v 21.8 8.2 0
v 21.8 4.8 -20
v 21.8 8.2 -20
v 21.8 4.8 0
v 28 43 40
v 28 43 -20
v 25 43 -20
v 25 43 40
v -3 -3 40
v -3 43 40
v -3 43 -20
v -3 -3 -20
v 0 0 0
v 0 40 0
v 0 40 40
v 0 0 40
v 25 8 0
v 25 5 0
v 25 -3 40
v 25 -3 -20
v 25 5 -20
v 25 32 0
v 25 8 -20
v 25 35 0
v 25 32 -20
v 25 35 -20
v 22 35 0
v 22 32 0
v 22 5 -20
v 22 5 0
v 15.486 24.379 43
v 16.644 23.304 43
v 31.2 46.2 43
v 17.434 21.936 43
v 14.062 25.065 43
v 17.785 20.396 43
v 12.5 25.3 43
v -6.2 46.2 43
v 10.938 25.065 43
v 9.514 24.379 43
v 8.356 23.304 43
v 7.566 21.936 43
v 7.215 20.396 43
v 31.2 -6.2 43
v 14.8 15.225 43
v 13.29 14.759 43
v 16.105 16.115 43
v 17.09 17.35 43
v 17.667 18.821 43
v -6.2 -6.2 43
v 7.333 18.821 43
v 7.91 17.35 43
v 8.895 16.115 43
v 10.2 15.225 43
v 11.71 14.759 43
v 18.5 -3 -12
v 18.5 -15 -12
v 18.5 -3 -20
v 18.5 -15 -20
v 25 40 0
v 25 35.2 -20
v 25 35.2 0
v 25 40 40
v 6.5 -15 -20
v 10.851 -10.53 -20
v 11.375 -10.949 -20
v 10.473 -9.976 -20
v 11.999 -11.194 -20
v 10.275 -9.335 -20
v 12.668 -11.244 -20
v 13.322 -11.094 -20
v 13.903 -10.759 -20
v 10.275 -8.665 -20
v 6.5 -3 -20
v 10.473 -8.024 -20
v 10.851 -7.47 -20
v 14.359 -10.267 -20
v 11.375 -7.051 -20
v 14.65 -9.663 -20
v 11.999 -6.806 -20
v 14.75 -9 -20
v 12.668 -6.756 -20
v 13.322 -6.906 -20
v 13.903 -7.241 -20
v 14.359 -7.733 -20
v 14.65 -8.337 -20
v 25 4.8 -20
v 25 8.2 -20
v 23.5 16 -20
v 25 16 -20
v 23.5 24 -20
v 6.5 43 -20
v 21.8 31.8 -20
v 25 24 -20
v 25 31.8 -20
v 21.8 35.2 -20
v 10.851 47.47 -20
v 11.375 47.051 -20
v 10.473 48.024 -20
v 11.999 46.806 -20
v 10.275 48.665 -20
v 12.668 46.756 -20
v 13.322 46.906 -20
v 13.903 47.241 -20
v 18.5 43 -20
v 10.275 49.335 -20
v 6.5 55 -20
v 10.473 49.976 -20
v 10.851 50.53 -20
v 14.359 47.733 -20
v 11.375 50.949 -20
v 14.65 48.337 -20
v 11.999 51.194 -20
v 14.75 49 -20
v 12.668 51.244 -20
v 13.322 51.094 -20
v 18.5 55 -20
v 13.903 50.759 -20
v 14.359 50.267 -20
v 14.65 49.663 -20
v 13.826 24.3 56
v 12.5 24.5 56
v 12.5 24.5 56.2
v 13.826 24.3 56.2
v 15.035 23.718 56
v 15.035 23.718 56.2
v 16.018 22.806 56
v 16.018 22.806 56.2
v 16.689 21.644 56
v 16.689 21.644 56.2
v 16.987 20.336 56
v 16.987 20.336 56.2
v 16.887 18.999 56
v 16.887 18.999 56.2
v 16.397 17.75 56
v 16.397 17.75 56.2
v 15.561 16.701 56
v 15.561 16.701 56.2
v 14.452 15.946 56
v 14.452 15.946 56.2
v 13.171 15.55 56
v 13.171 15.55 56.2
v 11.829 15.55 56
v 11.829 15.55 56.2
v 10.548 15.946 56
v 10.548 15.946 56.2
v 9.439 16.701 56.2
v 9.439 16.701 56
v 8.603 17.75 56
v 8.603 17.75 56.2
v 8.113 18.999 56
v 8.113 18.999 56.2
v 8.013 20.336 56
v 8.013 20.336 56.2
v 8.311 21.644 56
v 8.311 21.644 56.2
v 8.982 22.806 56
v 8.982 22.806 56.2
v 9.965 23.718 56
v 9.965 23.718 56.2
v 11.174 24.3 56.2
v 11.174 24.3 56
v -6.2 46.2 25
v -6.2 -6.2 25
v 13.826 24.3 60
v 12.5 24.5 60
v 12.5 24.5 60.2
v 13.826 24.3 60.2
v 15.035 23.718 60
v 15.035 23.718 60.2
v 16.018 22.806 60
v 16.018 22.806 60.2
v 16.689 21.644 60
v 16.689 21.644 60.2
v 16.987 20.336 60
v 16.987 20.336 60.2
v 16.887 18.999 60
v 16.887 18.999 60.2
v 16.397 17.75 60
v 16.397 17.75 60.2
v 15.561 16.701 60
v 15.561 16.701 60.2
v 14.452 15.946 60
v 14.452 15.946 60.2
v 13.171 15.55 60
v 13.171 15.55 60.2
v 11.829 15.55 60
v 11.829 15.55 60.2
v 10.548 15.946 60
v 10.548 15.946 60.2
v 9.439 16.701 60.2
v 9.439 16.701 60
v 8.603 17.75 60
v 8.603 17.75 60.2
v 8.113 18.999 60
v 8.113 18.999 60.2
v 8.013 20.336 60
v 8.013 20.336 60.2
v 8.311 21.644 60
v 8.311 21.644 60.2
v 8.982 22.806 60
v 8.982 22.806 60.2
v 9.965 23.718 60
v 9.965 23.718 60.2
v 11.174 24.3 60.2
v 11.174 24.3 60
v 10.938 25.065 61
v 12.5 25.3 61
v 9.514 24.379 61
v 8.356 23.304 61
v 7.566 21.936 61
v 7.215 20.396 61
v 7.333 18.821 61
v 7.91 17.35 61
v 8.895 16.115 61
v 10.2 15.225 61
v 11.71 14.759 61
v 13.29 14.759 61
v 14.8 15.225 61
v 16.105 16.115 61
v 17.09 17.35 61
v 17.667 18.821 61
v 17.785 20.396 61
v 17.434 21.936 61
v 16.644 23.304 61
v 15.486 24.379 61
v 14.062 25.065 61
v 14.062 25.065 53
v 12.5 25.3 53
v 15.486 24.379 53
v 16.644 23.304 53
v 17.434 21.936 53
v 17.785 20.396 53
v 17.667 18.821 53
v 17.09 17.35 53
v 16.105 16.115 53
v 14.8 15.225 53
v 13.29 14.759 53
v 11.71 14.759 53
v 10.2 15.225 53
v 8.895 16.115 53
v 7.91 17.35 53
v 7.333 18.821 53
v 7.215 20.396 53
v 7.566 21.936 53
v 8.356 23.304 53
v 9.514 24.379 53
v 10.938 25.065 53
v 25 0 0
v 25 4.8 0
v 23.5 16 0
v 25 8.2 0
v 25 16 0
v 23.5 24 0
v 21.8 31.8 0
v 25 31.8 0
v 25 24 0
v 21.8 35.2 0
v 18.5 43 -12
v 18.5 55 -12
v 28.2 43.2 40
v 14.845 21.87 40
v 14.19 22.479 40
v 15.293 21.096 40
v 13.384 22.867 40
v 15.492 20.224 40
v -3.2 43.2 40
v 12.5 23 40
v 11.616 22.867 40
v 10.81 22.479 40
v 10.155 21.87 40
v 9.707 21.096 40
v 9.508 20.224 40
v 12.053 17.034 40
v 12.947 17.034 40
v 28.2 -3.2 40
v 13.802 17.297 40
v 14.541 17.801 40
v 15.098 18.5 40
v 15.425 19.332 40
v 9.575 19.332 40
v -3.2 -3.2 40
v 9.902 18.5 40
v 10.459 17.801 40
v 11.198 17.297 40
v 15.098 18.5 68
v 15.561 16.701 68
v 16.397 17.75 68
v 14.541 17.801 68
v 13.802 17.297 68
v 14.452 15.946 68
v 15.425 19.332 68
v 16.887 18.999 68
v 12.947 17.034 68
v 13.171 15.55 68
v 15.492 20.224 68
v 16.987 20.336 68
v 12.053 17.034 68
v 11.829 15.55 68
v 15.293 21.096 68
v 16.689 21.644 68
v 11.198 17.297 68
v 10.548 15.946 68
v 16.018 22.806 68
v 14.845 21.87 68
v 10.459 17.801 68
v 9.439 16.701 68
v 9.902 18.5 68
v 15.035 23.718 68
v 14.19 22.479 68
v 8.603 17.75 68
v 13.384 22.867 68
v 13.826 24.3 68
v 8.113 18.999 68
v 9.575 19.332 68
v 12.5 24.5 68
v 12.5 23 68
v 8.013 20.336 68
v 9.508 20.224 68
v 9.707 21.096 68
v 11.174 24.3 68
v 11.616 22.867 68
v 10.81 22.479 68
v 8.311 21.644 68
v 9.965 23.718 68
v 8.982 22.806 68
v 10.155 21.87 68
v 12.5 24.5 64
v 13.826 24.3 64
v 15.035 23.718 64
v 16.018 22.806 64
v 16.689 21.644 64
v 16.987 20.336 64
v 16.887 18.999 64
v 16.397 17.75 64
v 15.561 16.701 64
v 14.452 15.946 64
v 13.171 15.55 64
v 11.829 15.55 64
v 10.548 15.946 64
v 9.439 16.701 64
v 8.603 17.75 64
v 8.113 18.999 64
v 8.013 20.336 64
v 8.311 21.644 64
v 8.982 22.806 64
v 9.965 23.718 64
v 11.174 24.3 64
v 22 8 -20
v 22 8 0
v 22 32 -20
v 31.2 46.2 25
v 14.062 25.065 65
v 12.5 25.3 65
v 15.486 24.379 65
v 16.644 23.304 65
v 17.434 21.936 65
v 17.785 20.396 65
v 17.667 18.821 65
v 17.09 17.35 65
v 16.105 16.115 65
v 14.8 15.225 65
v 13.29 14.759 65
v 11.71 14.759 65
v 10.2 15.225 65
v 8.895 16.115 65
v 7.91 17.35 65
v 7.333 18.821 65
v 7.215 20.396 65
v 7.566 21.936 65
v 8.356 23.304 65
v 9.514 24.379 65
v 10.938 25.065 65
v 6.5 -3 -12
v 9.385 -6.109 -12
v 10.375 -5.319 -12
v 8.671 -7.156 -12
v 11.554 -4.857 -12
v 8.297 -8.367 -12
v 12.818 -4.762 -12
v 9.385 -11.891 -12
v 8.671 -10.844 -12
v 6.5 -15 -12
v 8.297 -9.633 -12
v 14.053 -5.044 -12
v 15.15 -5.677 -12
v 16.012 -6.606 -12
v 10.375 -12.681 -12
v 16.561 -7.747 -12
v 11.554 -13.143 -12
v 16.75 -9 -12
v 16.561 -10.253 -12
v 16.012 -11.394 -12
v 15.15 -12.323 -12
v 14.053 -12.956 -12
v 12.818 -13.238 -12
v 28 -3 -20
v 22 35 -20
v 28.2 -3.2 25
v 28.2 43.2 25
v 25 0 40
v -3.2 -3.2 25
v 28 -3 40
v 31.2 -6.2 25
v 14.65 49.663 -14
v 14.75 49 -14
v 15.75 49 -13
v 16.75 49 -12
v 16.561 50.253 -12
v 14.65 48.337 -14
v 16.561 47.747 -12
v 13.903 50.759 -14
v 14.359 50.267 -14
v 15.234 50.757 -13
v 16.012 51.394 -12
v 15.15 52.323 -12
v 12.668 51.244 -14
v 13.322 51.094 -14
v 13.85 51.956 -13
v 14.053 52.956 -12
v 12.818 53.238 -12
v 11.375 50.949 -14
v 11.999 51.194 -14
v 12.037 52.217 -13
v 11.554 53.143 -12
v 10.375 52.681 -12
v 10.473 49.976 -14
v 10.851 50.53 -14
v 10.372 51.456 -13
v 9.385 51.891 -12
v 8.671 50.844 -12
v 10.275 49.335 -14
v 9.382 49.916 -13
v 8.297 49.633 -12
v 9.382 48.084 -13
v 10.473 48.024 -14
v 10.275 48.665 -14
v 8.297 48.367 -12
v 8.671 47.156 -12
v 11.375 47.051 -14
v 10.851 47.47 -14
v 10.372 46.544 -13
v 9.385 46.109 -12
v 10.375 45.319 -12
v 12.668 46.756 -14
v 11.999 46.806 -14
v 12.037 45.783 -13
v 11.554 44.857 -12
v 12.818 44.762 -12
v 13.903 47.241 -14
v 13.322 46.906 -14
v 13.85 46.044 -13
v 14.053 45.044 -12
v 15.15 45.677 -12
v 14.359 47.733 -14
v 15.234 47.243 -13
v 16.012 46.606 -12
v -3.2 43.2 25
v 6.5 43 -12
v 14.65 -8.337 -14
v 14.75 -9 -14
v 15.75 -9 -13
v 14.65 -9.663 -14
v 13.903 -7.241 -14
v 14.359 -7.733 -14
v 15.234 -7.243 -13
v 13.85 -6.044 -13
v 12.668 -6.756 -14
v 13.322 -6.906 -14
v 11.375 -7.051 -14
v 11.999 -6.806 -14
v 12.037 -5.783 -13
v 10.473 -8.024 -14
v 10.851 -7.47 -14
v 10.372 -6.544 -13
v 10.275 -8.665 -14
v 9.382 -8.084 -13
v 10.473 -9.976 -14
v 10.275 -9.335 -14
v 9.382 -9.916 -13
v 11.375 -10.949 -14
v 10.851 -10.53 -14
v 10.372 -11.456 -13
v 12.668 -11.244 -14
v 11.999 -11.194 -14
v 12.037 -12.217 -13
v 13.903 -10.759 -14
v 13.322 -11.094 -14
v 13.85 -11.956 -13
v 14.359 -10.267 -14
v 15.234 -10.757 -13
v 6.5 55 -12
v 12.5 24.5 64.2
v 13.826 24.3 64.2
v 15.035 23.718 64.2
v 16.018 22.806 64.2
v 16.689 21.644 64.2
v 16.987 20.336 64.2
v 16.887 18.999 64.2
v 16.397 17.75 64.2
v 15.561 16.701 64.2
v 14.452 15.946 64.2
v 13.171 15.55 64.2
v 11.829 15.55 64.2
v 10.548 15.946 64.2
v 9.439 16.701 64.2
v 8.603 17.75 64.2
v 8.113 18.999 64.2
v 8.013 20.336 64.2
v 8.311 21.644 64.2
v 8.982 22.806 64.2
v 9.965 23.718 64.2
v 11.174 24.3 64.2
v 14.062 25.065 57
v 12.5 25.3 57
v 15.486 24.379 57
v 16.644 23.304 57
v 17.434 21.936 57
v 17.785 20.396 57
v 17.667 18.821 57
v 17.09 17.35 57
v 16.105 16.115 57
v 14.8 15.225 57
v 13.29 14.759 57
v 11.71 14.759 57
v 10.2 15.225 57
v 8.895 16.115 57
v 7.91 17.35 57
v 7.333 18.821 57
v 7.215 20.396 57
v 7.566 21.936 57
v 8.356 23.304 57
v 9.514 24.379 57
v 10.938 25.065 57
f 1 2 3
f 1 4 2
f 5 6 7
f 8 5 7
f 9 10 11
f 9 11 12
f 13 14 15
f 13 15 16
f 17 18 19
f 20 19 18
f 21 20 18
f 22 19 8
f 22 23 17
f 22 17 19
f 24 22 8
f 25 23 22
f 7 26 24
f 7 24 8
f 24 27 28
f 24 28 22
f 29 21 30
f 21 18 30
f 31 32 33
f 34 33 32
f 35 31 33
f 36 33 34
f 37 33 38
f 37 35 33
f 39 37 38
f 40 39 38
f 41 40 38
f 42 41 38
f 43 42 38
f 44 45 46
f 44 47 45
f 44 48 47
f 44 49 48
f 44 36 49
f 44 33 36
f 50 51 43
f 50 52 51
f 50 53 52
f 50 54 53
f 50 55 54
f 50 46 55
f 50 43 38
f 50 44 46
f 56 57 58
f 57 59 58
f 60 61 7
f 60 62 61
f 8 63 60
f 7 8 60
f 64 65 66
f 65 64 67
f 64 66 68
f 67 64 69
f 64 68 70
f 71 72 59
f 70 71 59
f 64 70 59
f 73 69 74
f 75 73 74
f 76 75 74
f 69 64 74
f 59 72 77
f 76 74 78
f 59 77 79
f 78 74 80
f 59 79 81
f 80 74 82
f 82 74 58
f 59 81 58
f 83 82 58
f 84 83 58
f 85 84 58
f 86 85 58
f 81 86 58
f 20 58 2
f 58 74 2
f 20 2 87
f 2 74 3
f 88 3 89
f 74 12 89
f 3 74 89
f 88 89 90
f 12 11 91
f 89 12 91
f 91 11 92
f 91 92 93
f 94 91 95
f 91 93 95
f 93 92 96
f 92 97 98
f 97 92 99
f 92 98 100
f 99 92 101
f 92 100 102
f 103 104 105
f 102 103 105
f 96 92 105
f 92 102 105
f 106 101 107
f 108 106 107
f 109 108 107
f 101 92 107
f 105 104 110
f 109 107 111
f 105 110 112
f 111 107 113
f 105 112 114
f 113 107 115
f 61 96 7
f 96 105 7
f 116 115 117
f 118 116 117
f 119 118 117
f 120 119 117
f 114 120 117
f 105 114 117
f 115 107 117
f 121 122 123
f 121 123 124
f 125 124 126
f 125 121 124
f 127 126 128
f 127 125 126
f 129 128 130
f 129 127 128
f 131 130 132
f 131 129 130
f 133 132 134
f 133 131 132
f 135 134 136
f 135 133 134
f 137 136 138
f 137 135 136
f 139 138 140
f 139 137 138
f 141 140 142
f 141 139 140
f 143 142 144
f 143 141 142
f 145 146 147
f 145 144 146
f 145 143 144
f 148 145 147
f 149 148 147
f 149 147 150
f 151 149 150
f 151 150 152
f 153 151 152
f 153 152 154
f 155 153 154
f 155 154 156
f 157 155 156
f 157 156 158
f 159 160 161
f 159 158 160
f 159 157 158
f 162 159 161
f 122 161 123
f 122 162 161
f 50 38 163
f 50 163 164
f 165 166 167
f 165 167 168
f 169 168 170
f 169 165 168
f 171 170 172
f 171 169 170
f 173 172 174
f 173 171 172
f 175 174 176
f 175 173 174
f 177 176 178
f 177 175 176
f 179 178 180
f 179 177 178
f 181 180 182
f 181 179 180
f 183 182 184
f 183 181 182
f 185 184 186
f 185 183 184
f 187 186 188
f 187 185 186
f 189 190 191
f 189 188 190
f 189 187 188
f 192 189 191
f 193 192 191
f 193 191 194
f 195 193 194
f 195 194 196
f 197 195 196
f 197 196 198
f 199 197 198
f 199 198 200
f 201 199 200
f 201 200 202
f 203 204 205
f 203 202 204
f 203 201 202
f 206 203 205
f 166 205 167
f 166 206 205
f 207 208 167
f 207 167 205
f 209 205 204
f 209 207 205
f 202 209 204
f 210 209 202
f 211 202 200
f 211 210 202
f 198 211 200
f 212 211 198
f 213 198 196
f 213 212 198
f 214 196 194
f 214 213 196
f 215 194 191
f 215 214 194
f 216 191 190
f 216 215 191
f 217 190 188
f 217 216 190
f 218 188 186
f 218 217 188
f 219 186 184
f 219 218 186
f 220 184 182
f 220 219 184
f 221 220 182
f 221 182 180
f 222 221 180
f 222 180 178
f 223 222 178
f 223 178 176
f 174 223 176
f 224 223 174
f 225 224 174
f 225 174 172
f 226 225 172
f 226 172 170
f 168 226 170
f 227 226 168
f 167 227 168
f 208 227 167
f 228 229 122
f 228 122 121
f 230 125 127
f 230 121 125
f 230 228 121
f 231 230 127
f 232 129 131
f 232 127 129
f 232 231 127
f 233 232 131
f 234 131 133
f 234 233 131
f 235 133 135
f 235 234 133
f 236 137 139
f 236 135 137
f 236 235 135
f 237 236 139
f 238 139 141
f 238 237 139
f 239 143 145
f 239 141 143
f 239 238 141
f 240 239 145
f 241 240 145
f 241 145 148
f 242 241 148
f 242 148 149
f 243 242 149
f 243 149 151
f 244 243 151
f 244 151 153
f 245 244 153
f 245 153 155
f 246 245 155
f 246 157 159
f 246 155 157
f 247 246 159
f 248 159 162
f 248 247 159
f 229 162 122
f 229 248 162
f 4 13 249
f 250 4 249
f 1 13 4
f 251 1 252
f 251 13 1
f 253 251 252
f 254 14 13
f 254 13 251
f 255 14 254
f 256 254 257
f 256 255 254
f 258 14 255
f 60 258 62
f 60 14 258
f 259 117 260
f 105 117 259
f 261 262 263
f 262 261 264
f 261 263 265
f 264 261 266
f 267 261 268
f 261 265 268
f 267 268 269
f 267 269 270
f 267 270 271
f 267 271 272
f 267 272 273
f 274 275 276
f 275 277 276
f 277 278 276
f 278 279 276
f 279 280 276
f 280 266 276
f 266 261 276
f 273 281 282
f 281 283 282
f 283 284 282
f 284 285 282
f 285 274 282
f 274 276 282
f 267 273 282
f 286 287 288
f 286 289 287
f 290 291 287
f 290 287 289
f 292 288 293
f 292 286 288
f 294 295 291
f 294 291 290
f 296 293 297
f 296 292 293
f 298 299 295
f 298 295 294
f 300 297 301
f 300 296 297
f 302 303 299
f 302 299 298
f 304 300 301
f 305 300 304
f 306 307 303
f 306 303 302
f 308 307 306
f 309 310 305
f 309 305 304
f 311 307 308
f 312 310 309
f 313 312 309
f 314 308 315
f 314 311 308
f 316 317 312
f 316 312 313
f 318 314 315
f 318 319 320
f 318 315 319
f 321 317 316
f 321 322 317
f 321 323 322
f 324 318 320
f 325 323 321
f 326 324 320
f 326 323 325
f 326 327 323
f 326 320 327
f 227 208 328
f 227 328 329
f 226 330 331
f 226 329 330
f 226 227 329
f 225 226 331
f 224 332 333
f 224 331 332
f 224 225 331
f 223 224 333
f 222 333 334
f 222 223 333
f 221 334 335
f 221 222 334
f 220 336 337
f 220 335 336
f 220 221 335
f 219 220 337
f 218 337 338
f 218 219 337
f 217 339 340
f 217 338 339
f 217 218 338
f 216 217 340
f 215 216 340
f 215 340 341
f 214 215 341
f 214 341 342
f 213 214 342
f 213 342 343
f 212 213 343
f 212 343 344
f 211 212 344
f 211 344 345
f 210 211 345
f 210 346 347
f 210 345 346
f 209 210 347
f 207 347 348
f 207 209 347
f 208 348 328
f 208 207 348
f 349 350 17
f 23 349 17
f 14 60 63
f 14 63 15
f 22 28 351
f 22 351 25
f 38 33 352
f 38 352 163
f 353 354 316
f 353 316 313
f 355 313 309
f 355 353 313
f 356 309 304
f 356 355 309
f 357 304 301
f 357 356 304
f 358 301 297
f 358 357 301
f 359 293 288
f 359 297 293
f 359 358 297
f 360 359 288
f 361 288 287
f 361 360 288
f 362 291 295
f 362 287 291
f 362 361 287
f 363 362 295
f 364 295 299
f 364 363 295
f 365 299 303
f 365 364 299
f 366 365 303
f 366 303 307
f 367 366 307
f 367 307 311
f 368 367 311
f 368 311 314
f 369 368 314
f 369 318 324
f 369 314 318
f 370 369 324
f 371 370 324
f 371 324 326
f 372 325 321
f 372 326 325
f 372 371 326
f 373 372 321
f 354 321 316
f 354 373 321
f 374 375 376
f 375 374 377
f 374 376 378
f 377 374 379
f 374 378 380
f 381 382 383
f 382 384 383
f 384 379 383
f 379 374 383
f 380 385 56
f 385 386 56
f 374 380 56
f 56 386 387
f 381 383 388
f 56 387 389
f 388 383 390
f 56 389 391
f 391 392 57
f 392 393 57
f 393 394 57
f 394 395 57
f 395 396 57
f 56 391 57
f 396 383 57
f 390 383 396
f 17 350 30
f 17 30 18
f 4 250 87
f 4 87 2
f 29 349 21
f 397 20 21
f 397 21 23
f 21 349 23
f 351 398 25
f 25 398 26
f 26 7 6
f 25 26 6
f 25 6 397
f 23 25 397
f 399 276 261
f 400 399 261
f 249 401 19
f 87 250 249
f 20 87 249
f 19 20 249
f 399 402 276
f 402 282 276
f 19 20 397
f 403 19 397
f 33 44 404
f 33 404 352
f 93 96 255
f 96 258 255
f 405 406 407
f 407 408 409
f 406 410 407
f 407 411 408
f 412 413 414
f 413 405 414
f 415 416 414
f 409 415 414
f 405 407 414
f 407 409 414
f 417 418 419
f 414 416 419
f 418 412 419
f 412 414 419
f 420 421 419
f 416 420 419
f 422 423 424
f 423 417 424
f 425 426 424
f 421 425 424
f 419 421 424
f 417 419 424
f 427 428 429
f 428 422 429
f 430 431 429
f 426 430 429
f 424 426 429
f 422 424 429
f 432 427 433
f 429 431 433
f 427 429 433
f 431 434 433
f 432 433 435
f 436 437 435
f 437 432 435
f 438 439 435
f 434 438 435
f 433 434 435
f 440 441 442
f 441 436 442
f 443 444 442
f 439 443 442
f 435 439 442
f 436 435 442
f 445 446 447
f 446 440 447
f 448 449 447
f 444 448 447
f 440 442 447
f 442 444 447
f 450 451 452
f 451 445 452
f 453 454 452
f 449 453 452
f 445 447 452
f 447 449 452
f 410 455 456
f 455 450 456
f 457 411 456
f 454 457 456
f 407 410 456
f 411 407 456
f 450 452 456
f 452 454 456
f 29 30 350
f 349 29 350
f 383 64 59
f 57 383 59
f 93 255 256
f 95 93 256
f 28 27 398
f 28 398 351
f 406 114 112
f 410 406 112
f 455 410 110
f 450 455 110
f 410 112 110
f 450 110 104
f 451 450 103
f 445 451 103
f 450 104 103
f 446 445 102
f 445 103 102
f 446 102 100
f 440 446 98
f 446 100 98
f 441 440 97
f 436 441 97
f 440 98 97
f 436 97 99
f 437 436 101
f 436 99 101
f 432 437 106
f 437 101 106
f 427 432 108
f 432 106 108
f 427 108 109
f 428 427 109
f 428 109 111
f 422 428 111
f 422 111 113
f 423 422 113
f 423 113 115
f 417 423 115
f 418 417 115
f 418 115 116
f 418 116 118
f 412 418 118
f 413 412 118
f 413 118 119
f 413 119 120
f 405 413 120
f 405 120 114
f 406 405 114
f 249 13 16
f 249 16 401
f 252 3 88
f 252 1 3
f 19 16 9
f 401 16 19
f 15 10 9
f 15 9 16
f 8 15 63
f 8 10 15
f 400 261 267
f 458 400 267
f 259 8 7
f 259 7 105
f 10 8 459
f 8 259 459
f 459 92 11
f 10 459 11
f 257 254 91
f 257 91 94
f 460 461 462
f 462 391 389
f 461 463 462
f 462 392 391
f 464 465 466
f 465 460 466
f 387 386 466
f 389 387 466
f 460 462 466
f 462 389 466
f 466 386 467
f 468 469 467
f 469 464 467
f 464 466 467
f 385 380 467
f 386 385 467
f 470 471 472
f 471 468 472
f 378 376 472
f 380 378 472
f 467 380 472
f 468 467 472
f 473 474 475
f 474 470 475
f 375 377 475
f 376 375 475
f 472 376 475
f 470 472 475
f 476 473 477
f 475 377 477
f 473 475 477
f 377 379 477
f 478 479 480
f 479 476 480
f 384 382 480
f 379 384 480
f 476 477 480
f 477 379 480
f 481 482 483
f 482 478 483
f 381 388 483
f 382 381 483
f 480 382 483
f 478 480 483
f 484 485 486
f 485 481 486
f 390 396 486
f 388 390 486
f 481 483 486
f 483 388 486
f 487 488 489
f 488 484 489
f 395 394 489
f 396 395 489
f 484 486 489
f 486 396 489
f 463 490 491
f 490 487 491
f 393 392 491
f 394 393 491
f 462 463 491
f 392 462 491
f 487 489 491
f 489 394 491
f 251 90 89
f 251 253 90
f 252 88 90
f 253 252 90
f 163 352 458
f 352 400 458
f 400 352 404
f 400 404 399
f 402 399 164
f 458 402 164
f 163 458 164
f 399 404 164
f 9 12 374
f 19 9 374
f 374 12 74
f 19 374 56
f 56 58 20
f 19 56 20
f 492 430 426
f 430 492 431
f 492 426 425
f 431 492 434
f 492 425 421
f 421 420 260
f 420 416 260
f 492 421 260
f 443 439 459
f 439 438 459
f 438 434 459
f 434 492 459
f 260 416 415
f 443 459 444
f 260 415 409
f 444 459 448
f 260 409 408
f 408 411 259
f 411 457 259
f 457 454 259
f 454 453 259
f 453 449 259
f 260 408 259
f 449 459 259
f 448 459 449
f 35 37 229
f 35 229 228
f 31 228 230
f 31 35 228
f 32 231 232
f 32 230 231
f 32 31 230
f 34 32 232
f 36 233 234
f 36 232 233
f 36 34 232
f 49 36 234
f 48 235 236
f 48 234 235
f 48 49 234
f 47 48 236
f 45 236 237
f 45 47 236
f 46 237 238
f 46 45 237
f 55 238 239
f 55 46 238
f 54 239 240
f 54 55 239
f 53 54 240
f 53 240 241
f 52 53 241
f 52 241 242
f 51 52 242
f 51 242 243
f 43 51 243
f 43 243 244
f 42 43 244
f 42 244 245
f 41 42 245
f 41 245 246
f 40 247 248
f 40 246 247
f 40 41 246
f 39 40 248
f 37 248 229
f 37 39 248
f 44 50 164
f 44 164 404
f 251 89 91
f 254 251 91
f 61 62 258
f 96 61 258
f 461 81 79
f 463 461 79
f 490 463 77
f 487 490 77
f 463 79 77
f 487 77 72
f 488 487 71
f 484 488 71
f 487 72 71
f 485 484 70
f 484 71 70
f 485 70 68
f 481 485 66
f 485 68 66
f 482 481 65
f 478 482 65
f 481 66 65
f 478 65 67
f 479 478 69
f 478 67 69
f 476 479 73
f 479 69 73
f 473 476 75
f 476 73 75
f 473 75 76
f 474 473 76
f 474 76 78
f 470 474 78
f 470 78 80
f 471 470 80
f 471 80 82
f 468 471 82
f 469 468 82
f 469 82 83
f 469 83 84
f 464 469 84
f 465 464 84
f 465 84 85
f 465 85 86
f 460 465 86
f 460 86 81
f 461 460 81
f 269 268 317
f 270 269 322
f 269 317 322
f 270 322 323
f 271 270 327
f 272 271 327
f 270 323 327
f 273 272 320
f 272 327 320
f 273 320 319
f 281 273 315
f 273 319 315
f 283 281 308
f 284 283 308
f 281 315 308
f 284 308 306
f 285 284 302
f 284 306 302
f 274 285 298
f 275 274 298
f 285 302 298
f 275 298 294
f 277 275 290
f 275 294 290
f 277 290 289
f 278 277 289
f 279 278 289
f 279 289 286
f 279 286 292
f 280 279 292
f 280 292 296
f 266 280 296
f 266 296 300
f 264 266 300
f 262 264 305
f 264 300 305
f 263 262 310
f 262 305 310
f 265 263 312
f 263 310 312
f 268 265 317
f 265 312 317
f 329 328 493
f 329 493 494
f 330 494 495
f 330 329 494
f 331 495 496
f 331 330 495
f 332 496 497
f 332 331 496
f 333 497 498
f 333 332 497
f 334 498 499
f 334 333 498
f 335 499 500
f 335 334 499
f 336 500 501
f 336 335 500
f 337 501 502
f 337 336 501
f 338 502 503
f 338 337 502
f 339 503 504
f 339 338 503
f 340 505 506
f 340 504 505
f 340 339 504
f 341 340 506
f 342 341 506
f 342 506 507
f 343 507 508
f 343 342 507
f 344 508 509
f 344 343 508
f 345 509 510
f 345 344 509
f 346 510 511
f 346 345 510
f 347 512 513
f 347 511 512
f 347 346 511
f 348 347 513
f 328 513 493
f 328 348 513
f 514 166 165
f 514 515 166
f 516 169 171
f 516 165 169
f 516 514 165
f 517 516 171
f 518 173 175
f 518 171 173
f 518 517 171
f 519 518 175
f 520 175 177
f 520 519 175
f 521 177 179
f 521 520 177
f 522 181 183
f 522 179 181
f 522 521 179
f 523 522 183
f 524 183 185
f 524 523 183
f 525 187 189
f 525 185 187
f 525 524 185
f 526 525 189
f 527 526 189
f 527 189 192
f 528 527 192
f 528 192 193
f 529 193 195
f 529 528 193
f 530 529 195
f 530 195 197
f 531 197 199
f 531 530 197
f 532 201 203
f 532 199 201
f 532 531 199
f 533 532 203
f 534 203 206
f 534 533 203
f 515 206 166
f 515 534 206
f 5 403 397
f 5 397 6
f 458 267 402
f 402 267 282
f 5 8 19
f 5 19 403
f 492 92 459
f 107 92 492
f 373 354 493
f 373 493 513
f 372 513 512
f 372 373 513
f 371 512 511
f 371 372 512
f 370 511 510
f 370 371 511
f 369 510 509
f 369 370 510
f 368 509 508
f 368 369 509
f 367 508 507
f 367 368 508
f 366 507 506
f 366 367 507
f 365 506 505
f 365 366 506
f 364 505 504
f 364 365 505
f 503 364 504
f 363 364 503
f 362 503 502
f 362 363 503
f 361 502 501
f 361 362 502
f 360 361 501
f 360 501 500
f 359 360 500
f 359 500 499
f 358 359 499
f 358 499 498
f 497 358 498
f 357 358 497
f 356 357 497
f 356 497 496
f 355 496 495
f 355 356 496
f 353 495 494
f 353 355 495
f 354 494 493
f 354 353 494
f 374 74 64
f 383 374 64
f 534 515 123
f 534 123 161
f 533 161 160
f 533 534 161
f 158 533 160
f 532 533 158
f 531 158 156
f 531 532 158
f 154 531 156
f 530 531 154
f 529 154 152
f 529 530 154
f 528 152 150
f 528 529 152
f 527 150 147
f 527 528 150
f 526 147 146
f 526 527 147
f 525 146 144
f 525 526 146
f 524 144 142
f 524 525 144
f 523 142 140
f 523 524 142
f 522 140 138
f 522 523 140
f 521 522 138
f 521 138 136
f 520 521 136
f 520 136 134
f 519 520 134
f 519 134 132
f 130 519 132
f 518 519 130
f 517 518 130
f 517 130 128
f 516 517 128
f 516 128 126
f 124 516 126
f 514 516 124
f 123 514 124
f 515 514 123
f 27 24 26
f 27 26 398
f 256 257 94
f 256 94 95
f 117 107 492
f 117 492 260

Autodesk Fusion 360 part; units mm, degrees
sketch "Sketch1" plane through (0, 0, 0) normal (0, 0, 1) x (1, 0, 0)
  line L0 (0, 0) -> (25, 0)
  line L1 (25, 0) -> (25, 40)
  line L2 (25, 40) -> (0, 40)
  line L3 (0, 40) -> (0, 0)
  line L4 (-3, 43) -> (-3, -3)
  line L5 (-3, -3) -> (28, -3)
  line L6 (28, -3) -> (28, 43)
  line L7 (28, 43) -> (-3, 43)
  line L8 (25, 40) -> (25, 43)
  line L9 (25, 0) -> (25, -3)
  line L10 (23.5, 24) -> (25, 24)
  line L11 (25, 24) -> (25, 16)
  line L12 (25, 16) -> (23.5, 16)
  line L13 (23.5, 16) -> (23.5, 24)
  line L14 (25, 35) -> (22, 35)
  line L15 (22, 35) -> (22, 32)
  line L16 (22, 32) -> (25, 32)
  line L17 (25, 32) -> (25, 35)
  line L18 (0, 20) -> (28, 20) construction
  line L19 (22, 8) -> (25, 8)
  line L20 (25, 8) -> (25, 5)
  line L21 (22, 5) -> (22, 8)
  line L22 (25, 5) -> (22, 5)
  line L23 (25, 4.8) -> (21.8, 4.8)
  line L24 (21.8, 4.8) -> (21.8, 8.2)
  line L25 (21.8, 8.2) -> (25, 8.2)
  line L26 (25, 35.2) -> (21.8, 35.2)
  line L27 (21.8, 35.2) -> (21.8, 31.8)
  line L28 (21.8, 31.8) -> (25, 31.8)
  dimension "d1" = 25
  dimension "d2" = 40
  dimension "d3" = 3
  dimension "d4" = 1.5
  dimension "d5" = 8
  dimension "d14" = 3
  dimension "d15" = 3
  dimension "d16" = 5
  dimension "d17" = -0.2
  dimension "d18" = 0.2
extrude "Extrude1" add sketch "Sketch1" against normal blind 20 contours L0 L1 L2 L3 L10 L12 L13 L23 L24 L25 L26 L27 L28 | L0 L2 L3 L4 L5 L7 L8 L9 makes body 1 in component "chambermainhalf"
extrude "Extrude2" add sketch "Sketch1" along normal blind 40 contours L0 L2 L3 L4 L5 L7 L8 L9 bodies 1 in component "chambermainhalf"
extrude "Extrude1'" add sketch "Sketch1" along normal up to surface (40 mm away) and the other way up to surface (20 mm away) separate body contours L1 L5 L6 L7 L8 L9 L11 L17 L20 makes body 2 in component "chambersealplate"
extrude "Extrude2'" add sketch "Sketch1" against normal up to surface (20 mm away) contours L1 L19 L20 L21 L22 | L1 L14 L15 L16 L17 bodies 2 in component "chambersealplate"
sketch "Sketch1 (2)" plane through (0, 0, 40) normal (0, 0, 1) x (-1, 0, 0) in component "ChamberLid"
  line L0 (-25, -40) -> (-25, -43)
  line L1 (-25, -43) -> (3, -43)
  line L2 (3, -43) -> (3, 3)
  line L3 (3, 3) -> (-25, 3)
  line L4 (-25, 3) -> (-25, 0)
  line L5 (-25, 0) -> (0, 0)
  line L6 (0, 0) -> (0, -40)
  line L7 (0, -40) -> (-25, -40)
  line L8 (-25, -43) -> (-25, 3)
  line L9 (-25, 3) -> (-28, 3)
  line L10 (-28, 3) -> (-28, -43)
  line L11 (-28, -43) -> (-25, -43)
  line L12 (3.2, 3.2) -> (-25, 3.2)
  line L13 (-25, 3.2) -> (-28.2, 3.2)
  line L14 (-28.2, 3.2) -> (-28.2, -43.2)
  line L15 (-28.2, -43.2) -> (-25, -43.2)
  line L16 (-25, -43.2) -> (3.2, -43.2)
  line L17 (3.2, -43.2) -> (3.2, 3.2)
  line L18 (6.2, 6.2) -> (-25, 6.2)
  line L19 (-25, 6.2) -> (-31.2, 6.2)
  line L20 (-31.2, 6.2) -> (-31.2, -46.2)
  line L21 (-31.2, -46.2) -> (-25, -46.2)
  line L22 (-25, -46.2) -> (6.2, -46.2)
  line L23 (6.2, -46.2) -> (6.2, 6.2)
  dimension "d19" = 0.2
  dimension "d20" = 3.2
extrude "Extrude1''" add sketch "Sketch1 (2)" against normal blind 15 separate body contours L18 L19 L20 L21 L22 L23 makes body 3 in component "ChamberLid"
sketch "Sketch2" plane through (0, 0, 40) normal (0, 0, 1) x (-1, 0, 0) in component "ChamberLid"
  line L0 (3.2, 3.2) -> (3.2, -43.2)
  line L1 (3.2, -43.2) -> (-25, -43.2)
  line L2 (-25, -43.2) -> (-28.2, -43.2)
  line L3 (-28.2, -43.2) -> (-28.2, 3.2)
  line L4 (-28.2, 3.2) -> (-25, 3.2)
  line L5 (-25, 3.2) -> (3.2, 3.2)
  line L6 (6.2, -46.2) -> (6.2, 6.2)
  line L7 (6.2, 6.2) -> (-25, 6.2)
  line L8 (-25, 6.2) -> (-31.2, 6.2)
  line L9 (-31.2, 6.2) -> (-31.2, -46.2)
  line L10 (-31.2, -46.2) -> (-25, -46.2)
  line L11 (-25, -46.2) -> (6.2, -46.2)
extrude "Extrude2''" add sketch "Sketch2" along normal blind 3 contours L0 L1 L2 L3 L4 L5 | L6 L7 L8 L9 L10 L11 bodies 3 in component "ChamberLid"
ref_plane "WorkPlane1" through (12.5, 20, 34) normal (-1, 0, 0) x (0, 1, 0) in component "ChamberLid"
sketch "Sketch3" plane through (12.5, 20, 34) normal (-1, 0, 0) x (0, 1, 0) in component "ChamberLid"
  line L0 (-26.2, -9) -> (26.2, -9)
  line L1 (0, -9) -> (0, -35) construction
  line L2 (5, -9) -> (5, -35) construction
  line L3 (4.5, -9) -> (3, -9)
  line L4 (3, -9) -> (3, -34)
  line L5 (3, -34) -> (4.5, -34)
  line L6 (4.5, -34) -> (4.5, -9)
  line L7 (4.5, -34) -> (5.3, -31)
  line L8 (5.3, -31) -> (4.5, -31)
  line L9 (5.3, -31) -> (4.5, -30.2)
  line L10 (4.5, -30) -> (5.3, -27)
  line L11 (5.3, -27) -> (4.5, -27)
  line L12 (5.3, -27) -> (4.5, -26.2)
  line L13 (4.5, -26) -> (5.3, -23)
  line L14 (5.3, -23) -> (4.5, -23)
  line L15 (5.3, -23) -> (4.5, -22.2)
  line L16 (4.5, -22) -> (5.3, -19)
  line L17 (5.3, -19) -> (4.5, -19)
  line L18 (5.3, -19) -> (4.5, -18.2)
  line L19 (5.3, -19) -> (5.3, -9)
  dimension "d25" = 5
  dimension "d26" = 1.5
  dimension "d27" = 25
  dimension "d28" = 0.5
  dimension "d29" = 3
  dimension "d30" = 0.8
  dimension "d31" = 45
  dimension "d34" = 0
  dimension "d35" = 4
revolve "Revolve1" add sketch "Sketch3" angle 360 about axis through (12.5, 20, 43) along (0, 0, 1) bodies 3 in component "ChamberLid"
extrude "Extrude3" cut 1 faces at (11.9171, 21.8898, 43) along direction (0, 0, -1) through all on bodies 3 bodies 3 in component "ChamberLid"
sketch "Sketch1 (3)" plane through (0, 0, -20) normal (0, 0, -1) x (1, 0, 0) in component "chambermainhalf"
  line L0 (25, -43) -> (25, -35.2)
  line L1 (25, -35.2) -> (21.8, -35.2)
  line L2 (21.8, -35.2) -> (21.8, -31.8)
  line L3 (21.8, -31.8) -> (25, -31.8)
  line L4 (25, -31.8) -> (25, -24)
  line L5 (25, -24) -> (23.5, -24)
  line L6 (23.5, -24) -> (23.5, -16)
  line L7 (23.5, -16) -> (25, -16)
  line L8 (25, -16) -> (25, -8.2)
  line L9 (25, -8.2) -> (21.8, -8.2)
  line L10 (21.8, -8.2) -> (21.8, -4.8)
  line L11 (21.8, -4.8) -> (25, -4.8)
  line L12 (25, -4.8) -> (25, 3)
  line L13 (25, 3) -> (-3, 3)
  line L14 (-3, 3) -> (-3, -43)
  line L15 (-3, -43) -> (25, -43)
  line L16 (6.5, 15) -> (18.5, 15)
  line L17 (18.5, 15) -> (18.5, 3)
  line L18 (18.5, 3) -> (6.5, 3)
  line L19 (6.5, 3) -> (6.5, 15)
  line L20 (28, 3) -> (25, 3) construction
  line L21 (25, 3) -> (25, -5) construction
  line L22 (25, -5) -> (22, -5) construction
  line L23 (22, -5) -> (22, -8) construction
  line L24 (22, -8) -> (25, -8) construction
  line L25 (25, -8) -> (25, -32) construction
  line L26 (25, -32) -> (22, -32) construction
  line L27 (22, -32) -> (22, -35) construction
  line L28 (22, -35) -> (25, -35) construction
  line L29 (25, -35) -> (25, -43) construction
  line L30 (25, -43) -> (28, -43) construction
  line L31 (28, -43) -> (28, 3) construction
  line L32 (28, 3) -> (-3, 3) construction
  line L33 (-3, -20) -> (23.5, -20) construction
  line L34 (6.5, -43) -> (6.5, -55)
  line L35 (18.5, -55) -> (18.5, -43)
  line L36 (18.5, -43) -> (6.5, -43)
  line L37 (6.5, -55) -> (18.5, -55)
  line L38 (12.5, 15) -> (12.5, 3) construction
  circle A0 centre (12.5, 9) radius 2.25
  circle A1 centre (12.5, -49) radius 2.25
  dimension "d40" = 12
  dimension "d41" = 12
  dimension "d44" = 4.5
extrude "Extrude3'" add sketch "Sketch1 (3)" against normal blind 8 contours L15 L34 L35 L36 L37 | L13 L16 L17 L18 L19 bodies 1 in component "chambermainhalf"
chamfer "Chamfer1" distance 2 angle 45 2 edges at (10.4023, -8.1864, -12) (10.4023, 49.8136, -12) on bodies 1 in component "chambermainhalf"
component "chambermainhalf" placed x (1, 0, 0) y (0, 1, 0) z (0, 0, 1) at (0, 0, 0)
component "chambersealplate" placed x (1, 0, 0) y (0, 1, 0) z (0, 0, 1) at (0, 0, 0)
component "ChamberLid" placed x (1, 0, 0) y (0, 1, 0) z (0, 0, 1) at (0, 0, 0)
